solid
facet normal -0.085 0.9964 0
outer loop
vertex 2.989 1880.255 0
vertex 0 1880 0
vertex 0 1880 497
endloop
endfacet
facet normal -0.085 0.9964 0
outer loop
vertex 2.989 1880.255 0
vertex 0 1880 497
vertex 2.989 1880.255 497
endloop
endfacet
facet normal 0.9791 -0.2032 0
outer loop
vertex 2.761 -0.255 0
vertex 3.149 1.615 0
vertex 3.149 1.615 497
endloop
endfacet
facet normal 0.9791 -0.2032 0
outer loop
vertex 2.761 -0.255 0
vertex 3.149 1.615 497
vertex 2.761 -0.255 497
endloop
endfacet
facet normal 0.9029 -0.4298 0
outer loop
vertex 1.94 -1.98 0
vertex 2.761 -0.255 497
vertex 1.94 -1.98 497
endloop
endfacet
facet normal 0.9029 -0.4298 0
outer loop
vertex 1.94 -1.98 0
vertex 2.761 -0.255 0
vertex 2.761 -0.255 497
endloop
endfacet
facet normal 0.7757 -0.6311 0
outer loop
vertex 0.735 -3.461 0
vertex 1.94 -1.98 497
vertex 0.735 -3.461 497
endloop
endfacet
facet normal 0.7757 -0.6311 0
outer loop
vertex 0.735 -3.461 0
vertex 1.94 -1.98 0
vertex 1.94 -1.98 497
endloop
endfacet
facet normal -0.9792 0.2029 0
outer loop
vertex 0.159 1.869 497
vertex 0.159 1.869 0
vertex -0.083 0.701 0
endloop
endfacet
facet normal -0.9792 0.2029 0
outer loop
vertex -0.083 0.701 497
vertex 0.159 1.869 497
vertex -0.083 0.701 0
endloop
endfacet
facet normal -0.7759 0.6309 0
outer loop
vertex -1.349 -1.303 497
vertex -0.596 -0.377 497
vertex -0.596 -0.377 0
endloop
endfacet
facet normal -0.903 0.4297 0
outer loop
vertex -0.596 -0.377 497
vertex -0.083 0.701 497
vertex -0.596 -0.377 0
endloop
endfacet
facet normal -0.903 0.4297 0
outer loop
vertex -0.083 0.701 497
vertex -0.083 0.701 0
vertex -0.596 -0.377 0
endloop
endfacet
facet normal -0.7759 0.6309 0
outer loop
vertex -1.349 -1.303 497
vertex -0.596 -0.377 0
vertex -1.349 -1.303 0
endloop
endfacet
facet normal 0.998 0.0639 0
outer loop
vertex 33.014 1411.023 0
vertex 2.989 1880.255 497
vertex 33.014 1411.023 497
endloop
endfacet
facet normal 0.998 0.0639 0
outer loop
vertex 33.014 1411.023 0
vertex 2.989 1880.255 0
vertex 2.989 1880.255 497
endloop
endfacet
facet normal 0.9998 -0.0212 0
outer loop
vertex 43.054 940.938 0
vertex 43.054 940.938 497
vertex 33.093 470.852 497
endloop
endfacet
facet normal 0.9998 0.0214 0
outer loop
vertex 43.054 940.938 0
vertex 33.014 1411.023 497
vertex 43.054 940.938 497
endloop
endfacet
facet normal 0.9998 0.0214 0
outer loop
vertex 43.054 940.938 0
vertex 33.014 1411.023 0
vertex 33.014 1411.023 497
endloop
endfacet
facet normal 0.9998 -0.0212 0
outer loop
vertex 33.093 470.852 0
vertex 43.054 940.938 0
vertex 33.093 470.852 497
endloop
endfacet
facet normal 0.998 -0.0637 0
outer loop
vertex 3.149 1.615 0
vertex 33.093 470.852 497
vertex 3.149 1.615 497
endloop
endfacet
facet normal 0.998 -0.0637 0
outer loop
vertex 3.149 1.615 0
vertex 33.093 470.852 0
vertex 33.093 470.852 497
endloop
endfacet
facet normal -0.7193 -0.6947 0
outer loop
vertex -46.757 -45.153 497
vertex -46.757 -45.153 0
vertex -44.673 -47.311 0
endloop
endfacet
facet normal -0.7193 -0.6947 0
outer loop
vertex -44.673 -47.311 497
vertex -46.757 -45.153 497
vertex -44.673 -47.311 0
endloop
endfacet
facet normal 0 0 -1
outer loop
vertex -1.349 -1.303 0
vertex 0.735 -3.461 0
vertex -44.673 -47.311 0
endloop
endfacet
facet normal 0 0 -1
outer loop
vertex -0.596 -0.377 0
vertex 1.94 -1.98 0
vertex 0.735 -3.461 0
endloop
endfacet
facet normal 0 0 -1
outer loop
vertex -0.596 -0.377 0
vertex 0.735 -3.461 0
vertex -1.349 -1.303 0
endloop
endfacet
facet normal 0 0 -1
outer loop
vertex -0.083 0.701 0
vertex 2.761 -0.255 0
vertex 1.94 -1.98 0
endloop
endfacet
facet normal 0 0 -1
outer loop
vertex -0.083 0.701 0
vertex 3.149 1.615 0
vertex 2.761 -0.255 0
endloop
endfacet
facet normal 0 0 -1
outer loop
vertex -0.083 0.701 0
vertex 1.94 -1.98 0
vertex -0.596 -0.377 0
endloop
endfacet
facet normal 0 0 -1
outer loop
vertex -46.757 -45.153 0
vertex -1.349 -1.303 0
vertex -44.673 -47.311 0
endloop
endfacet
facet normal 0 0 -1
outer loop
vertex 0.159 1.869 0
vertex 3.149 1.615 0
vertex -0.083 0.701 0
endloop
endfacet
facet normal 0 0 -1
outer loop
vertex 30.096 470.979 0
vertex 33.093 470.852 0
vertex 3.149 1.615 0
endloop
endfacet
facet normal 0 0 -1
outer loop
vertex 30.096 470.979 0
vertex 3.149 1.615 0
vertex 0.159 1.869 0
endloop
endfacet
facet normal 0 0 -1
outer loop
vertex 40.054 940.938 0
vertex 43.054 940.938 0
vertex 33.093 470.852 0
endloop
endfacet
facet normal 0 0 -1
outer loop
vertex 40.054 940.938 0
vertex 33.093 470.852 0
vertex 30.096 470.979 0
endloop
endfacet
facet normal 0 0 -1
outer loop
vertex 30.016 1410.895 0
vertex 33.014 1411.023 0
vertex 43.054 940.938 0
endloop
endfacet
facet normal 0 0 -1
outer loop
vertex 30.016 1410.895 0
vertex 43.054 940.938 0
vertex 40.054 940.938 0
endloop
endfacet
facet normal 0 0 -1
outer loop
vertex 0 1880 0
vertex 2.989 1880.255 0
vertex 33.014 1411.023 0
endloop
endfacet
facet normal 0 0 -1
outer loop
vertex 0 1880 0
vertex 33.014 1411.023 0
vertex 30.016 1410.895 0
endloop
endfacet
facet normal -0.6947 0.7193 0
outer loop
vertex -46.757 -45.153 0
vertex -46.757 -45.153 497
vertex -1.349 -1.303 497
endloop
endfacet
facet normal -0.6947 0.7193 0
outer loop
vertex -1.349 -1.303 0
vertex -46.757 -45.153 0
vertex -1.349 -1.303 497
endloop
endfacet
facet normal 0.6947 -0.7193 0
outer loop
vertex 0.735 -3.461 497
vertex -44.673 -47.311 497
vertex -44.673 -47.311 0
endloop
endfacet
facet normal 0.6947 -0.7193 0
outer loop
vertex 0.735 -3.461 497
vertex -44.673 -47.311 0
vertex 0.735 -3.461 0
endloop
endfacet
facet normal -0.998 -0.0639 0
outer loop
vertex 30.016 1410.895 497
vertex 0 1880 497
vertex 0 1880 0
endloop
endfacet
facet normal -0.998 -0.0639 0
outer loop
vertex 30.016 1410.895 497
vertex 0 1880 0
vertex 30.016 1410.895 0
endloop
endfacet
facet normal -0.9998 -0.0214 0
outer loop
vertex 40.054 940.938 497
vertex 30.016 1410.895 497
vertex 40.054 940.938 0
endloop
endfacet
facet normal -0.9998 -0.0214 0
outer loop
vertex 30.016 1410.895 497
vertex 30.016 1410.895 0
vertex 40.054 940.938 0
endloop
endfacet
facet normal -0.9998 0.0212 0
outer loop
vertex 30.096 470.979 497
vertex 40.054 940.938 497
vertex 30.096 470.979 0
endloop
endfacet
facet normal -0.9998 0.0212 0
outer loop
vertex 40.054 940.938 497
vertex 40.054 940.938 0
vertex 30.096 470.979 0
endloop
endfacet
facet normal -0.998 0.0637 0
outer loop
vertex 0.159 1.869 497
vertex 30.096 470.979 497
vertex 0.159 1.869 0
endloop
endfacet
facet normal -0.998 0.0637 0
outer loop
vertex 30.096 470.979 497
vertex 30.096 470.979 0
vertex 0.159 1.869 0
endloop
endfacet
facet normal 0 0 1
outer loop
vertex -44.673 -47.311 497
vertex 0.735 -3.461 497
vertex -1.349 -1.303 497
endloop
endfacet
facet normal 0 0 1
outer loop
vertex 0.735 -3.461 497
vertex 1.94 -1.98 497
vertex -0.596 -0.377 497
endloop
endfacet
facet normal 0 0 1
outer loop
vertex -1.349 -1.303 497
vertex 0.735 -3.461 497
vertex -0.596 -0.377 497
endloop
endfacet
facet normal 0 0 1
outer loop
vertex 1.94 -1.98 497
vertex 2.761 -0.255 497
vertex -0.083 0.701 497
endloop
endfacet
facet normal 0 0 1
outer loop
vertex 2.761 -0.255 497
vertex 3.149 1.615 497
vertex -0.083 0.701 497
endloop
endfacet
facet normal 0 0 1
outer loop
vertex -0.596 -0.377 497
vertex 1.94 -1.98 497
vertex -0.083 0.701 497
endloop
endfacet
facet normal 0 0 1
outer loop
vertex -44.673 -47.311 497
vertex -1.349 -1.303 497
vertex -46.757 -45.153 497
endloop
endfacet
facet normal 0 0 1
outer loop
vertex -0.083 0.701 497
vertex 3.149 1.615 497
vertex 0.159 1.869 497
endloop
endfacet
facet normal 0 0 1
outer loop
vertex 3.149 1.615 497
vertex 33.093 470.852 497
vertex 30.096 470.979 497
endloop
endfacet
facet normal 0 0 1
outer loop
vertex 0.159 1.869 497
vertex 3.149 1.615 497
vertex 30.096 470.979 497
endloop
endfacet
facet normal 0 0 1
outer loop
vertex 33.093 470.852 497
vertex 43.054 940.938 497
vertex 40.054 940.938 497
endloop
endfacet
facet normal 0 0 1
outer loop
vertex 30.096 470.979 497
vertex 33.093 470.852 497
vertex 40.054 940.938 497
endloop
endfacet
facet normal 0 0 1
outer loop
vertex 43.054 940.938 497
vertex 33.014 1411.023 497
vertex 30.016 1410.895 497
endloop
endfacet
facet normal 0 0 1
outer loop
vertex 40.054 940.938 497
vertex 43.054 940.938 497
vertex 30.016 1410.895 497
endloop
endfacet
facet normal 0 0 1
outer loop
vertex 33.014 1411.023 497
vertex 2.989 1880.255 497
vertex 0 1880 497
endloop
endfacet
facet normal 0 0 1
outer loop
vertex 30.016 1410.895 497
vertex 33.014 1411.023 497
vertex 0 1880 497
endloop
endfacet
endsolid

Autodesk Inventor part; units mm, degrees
ref_plane "YZ Plane" through (0, 0, 0) normal (1, 0, 0) x (0, 1, 0)
ref_plane "XZ Plane" through (0, 0, 0) normal (0, 1, 0) x (-1, 0, 0)
ref_plane "XY Plane" through (0, 0, 0) normal (0, 0, 1) x (1, 0, 0)
sketch "Sketch1" plane through (0, 0, 0) normal (0, 0, 1) x (1, 0, 0)
  arc A0 (0, 0) -> (0.159434, 1.869277) centre (-11009.945504, 940) ccw construction
  arc A1 (-1.349222, -1.302929) -> (0.159434, 1.869277) centre (-4.822514, 2.29377) ccw
  line L0 (-41.190716, -50.91694) -> (-46.757087, -45.152794) construction
  line L1 (-46.757087, -45.152794) -> (-1.349222, -1.302929)
  arc A2 (0.159434, 1.869277) -> (0, 1880) centre (-11009.945504, 940) ccw
  line L2 (-1.349222, -1.302929) -> (0, 0) construction
  line L3 (0, 0) -> (0, 1880) construction
  line L4 (0, 0) -> (1.875639, 0) construction
  dimension "d148" = 5
  dimension "d153" = 65
  dimension "d165" = 11050
  dimension "d167" = 136
  dimension "d168" = 1880
contour flange "Contour Flange2" sketch "Sketch1" thickness 3 bend radius 5 width 497 along (0, 0, 1) mid plane no both sides no wall seen from (-24.053155, -23.227861, 0) lies toward (0.6946584, -0.7193398, 0) curves L1 A1 A2
bend "Bend2"
corner "Corner2"
sketch "Sketch4" plane through (-1.349222, -1.302929, 497) normal (-0.6946584, 0.7193398, 0) x (0.7193398, 0.6946584, 0)
  line L0 (-81.994451, 7.589283) -> (-81.994451, 144.595466) construction
  line L1 (-81.994451, 144.595466) -> (-67.034181, 144.595466) construction
  line L2 (-67.034181, 144.595466) -> (-67.034181, 7.589283) construction
  line L3 (-67.034181, 7.589283) -> (-81.994451, 7.589283) construction
  point P0 (1.875639, 497)
feature "Mark3" [suppressed]
equation "\"d36\" = Thickness"
equation "\"d37\" = BendReliefWidth"
equation "\"d38\" = BendReliefDepth"
equation "\"d39\" = MinimumRemnant"
equation "\"d40\" = TransitionRadius"
equation "\"d42\" = BendRadius"
equation "\"d44\" = CornerReliefSize"
equation "\"d45\" = GapSize"
equation "\"d46\" = JacobiRadiusSize"
equation "\"BendReliefWidth\" = Thickness"
equation "\"BendReliefDepth\" = 0.5 * Thickness"
equation "\"CornerReliefSize\" = 4 * Thickness"
equation "\"MinimumRemnant\" = 2 * Thickness"
equation "\"GapSize\" = Thickness"
equation "\"Thickness\" = 3"
equation "\"TransitionRadius\" = 5"
equation "\"BendRadius\" = 5"
equation "\"JacobiRadiusSize\" = 5"
properties part number "MSC 301 sheet left-right board hip" material "Stainless Steel AISI 304"
